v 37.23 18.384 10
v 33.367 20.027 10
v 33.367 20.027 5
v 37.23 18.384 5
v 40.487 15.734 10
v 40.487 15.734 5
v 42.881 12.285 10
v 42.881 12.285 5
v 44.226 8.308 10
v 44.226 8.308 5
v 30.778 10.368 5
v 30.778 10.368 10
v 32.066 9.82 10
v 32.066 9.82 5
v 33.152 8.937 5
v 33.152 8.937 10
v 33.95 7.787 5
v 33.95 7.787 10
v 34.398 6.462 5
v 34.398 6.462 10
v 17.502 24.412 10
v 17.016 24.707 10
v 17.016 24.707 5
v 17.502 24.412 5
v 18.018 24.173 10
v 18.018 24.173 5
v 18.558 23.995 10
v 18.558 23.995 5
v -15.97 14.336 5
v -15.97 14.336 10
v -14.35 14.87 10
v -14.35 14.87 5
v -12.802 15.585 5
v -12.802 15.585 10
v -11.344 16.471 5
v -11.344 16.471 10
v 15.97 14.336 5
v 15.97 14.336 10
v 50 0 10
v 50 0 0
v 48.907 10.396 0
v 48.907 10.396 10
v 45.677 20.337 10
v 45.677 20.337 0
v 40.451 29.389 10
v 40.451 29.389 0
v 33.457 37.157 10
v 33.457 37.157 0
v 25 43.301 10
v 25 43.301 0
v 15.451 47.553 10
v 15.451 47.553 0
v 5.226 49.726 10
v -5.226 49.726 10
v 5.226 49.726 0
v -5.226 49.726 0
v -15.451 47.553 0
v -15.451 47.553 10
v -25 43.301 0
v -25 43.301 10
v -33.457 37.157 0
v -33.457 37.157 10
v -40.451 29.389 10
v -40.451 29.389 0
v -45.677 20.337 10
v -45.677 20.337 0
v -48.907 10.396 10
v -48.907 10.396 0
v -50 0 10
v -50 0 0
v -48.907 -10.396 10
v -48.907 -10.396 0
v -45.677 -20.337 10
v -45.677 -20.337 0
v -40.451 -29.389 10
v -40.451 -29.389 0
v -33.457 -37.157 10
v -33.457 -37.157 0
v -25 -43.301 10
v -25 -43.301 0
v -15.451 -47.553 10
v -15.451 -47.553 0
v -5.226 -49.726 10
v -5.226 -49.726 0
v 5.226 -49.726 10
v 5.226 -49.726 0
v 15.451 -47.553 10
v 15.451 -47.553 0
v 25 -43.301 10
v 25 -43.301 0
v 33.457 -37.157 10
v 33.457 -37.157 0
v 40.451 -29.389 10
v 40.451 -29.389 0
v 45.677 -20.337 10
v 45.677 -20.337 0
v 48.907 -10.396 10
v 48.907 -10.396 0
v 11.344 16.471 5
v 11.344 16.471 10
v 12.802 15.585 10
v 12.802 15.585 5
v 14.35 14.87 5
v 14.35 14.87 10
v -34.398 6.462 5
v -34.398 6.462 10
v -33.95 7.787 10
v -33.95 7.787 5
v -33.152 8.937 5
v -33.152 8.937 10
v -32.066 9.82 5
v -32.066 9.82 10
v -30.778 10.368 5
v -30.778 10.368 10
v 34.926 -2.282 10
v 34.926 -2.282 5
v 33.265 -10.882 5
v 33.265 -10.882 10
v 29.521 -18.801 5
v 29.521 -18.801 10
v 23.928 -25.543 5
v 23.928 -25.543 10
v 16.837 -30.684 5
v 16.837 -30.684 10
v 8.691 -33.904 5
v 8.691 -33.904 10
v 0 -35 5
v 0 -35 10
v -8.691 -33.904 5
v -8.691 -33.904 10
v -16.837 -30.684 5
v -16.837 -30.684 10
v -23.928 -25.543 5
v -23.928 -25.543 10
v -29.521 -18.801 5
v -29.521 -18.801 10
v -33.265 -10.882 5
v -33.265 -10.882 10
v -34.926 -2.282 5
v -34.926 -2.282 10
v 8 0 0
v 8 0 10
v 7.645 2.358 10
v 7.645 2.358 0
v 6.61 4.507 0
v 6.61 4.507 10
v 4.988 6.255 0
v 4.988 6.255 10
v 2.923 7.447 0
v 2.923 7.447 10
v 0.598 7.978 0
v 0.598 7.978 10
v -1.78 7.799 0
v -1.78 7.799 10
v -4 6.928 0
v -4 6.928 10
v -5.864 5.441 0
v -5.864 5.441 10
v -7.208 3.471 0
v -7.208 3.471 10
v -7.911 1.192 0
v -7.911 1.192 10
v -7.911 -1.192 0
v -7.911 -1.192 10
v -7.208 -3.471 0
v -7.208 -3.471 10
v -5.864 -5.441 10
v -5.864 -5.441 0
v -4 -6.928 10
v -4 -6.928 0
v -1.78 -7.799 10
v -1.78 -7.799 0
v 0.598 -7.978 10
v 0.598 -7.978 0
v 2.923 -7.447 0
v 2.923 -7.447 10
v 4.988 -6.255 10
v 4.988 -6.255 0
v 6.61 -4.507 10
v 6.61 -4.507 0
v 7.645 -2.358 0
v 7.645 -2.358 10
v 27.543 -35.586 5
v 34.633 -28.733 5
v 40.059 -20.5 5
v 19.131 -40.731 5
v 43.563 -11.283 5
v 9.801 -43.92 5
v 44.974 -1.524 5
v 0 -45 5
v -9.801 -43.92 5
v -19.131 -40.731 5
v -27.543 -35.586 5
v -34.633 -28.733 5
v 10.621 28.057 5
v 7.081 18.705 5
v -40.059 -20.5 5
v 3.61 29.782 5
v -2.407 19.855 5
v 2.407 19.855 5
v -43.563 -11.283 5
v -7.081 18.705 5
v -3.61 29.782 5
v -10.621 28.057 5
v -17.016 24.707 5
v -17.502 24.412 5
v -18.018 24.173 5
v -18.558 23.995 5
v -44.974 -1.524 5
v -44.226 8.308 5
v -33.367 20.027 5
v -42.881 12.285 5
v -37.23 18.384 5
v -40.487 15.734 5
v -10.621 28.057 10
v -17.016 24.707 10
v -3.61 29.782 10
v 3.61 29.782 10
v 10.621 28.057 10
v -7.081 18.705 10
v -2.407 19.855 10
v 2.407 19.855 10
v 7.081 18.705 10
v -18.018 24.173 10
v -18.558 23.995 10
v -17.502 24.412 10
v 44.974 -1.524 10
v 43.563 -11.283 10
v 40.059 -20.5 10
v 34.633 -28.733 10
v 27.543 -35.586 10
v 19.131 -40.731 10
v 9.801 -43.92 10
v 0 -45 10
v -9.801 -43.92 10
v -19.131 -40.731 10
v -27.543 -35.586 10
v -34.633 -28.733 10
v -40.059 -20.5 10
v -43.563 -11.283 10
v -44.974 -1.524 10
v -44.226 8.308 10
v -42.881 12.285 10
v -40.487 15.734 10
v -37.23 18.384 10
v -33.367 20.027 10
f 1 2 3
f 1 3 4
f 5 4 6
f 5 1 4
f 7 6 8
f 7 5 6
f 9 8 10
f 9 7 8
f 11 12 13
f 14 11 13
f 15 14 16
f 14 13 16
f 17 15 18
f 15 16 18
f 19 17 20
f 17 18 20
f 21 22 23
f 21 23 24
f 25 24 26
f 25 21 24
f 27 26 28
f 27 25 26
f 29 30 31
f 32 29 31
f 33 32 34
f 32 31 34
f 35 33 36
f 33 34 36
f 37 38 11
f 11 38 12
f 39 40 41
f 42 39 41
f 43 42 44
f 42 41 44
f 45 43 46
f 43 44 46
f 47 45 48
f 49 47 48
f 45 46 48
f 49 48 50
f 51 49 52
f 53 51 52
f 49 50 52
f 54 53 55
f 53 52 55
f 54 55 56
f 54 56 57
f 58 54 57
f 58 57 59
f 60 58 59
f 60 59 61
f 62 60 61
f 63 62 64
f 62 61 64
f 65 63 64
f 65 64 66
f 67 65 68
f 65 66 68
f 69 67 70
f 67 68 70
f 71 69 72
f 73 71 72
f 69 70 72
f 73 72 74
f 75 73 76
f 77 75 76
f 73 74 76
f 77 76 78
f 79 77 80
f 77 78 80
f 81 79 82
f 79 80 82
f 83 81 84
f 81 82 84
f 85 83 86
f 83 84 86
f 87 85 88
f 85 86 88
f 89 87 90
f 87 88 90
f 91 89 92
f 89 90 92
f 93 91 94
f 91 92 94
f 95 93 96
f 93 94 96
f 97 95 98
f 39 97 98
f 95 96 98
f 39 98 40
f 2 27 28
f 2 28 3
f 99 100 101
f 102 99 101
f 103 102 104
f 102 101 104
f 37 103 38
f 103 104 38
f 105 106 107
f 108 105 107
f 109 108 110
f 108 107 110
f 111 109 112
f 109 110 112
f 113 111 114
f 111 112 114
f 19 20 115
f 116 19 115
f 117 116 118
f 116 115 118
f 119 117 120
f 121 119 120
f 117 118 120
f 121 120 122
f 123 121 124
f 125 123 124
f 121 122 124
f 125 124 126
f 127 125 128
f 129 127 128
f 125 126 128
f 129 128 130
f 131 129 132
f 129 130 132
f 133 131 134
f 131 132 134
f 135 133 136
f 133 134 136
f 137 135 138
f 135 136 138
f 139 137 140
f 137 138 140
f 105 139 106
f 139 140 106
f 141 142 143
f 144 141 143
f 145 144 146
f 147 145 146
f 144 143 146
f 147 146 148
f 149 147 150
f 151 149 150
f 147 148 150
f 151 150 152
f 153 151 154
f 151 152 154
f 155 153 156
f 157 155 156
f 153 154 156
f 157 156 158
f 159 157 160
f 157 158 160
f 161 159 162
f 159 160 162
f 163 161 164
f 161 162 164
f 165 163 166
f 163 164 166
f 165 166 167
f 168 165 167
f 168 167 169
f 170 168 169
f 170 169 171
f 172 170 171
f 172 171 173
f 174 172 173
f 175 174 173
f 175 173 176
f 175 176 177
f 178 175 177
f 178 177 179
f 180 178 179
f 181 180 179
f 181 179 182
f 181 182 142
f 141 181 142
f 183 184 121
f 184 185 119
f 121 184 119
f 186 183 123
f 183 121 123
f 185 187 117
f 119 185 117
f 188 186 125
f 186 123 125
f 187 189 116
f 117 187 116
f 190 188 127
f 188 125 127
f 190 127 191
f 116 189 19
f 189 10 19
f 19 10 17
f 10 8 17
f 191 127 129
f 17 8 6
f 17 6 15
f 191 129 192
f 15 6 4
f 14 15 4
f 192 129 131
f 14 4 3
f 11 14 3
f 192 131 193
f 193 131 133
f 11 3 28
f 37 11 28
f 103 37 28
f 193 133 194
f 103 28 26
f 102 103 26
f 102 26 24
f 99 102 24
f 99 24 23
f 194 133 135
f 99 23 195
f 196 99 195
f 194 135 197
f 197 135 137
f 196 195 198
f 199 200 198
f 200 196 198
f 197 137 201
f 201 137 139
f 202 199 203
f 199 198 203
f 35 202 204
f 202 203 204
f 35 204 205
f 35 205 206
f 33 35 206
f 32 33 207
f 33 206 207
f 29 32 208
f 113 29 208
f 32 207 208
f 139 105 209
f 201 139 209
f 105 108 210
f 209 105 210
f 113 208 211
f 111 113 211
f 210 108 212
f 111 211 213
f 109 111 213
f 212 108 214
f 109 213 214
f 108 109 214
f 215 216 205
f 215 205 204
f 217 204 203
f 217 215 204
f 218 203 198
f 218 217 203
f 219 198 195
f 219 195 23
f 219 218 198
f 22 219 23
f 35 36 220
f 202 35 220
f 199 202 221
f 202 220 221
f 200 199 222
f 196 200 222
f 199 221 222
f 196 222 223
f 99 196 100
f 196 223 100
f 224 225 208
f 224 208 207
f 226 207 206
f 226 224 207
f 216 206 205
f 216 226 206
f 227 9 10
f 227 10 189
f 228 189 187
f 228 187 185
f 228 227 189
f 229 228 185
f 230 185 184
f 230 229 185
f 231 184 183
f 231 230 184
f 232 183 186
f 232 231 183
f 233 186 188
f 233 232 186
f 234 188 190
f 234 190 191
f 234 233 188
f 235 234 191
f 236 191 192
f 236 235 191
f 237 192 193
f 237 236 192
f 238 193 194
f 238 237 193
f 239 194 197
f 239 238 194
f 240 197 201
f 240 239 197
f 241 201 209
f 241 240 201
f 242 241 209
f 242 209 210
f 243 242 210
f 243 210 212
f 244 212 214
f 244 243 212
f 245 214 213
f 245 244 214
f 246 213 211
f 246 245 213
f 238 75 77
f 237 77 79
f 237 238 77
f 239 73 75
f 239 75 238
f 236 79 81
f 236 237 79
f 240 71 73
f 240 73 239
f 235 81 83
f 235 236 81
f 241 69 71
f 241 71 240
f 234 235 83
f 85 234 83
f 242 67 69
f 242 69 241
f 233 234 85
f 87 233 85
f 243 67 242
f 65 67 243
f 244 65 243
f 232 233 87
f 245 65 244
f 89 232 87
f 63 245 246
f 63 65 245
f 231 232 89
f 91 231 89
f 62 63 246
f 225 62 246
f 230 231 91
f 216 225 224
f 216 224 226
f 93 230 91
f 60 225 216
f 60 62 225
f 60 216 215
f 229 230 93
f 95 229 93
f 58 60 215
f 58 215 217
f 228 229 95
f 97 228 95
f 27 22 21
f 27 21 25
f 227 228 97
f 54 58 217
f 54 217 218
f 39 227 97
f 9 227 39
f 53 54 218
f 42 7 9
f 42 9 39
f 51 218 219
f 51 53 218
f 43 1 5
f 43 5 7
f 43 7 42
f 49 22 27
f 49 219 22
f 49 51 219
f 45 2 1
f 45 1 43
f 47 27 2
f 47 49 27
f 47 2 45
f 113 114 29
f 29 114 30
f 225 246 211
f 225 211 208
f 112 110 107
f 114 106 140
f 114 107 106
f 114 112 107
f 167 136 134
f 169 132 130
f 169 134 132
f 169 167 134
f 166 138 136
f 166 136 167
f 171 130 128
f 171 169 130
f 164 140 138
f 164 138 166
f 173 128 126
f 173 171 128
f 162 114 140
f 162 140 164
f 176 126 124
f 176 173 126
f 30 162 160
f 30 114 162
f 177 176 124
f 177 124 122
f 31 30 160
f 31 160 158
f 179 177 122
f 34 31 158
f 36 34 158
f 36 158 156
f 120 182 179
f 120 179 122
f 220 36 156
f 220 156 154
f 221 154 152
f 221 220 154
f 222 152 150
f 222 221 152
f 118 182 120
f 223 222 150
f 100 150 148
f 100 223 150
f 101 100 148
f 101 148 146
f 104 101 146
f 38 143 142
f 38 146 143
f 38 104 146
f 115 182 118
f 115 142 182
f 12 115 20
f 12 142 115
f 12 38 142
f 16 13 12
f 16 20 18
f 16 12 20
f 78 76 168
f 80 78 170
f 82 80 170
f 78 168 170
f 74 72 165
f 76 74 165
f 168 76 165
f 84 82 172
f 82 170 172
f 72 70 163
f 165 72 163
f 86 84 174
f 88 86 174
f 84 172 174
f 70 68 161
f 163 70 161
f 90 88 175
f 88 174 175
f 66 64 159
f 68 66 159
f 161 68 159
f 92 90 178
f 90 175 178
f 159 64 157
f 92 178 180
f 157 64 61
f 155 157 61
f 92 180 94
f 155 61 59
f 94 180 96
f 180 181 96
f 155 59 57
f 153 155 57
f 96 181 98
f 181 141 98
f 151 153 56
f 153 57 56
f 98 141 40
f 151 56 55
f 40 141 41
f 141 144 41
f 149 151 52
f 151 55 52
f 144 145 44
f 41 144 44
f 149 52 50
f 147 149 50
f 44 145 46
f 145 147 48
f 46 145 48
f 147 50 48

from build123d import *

# Parameters (mm, degrees)
SKETCH_1_R            = 50
EXTRUDE_1_DEPTH       = 10
CUT_EXTRUDE_1_DEPTH   = 5
SKETCH_4_R            = 8
CUT_EXTRUDE_1_2_DEPTH = 72.414284285


with BuildPart() as part:
    # 草图1 → 凸台-拉伸1 (new body)
    with BuildSketch(Plane.XY):
        Circle(SKETCH_1_R)
    extrude(amount=EXTRUDE_1_DEPTH)

    # 草图2 → Cut-Extrude 1 (cut)
    with BuildSketch(Plane.XY.offset(10)):
        with BuildLine():
            ThreePointArc((44.226450487, 8.307892471), (0, -45), (-44.226450487, 8.307892471))
            ThreePointArc((-44.226450487, 8.307892471), (-40.486781839, 15.733956697), (-33.366586001, 20.027482375))
            Line((-33.366586001, 20.027482375), (-18.55842138, 23.995318126))
            ThreePointArc((-18.55842138, 23.995318126), (-17.756990045, 24.285259115), (-17.016442805, 24.70709765))
            ThreePointArc((-17.016442805, 24.70709765), (0, 30), (17.016442805, 24.70709765))
            ThreePointArc((17.016442805, 24.70709765), (17.756990045, 24.285259115), (18.55842138, 23.995318126))
            Line((18.55842138, 23.995318126), (33.366586001, 20.027482375))
            ThreePointArc((33.366586001, 20.027482375), (40.486781839, 15.733956697), (44.226450487, 8.307892471))
        make_face()
        with BuildLine():
            ThreePointArc((34.398350379, 6.461694144), (0, -35), (-34.398350379, 6.461694144))
            ThreePointArc((-34.398350379, 6.461694144), (-33.151794163, 8.937048886), (-30.77839555, 10.368224112))
            Line((-30.77839555, 10.368224112), (-15.970230929, 14.336059864))
            ThreePointArc((-15.970230929, 14.336059864), (-13.565936922, 15.20588283), (-11.344295203, 16.471398433))
            ThreePointArc((-11.344295203, 16.471398433), (0, 20), (11.344295203, 16.471398433))
            ThreePointArc((11.344295203, 16.471398433), (13.565936922, 15.20588283), (15.970230929, 14.336059864))
            Line((15.970230929, 14.336059864), (30.77839555, 10.368224112))
            ThreePointArc((30.77839555, 10.368224112), (33.151794163, 8.937048886), (34.398350379, 6.461694144))
        make_face(mode=Mode.SUBTRACT)
    extrude(amount=-CUT_EXTRUDE_1_DEPTH, mode=Mode.SUBTRACT)

    # 草图4 → Cut-Extrude 1 2 (cut, through all)
    with BuildSketch(Plane.XY.offset(10)):
        Circle(SKETCH_4_R)
    extrude(amount=-CUT_EXTRUDE_1_2_DEPTH, mode=Mode.SUBTRACT)


solid = part.part
